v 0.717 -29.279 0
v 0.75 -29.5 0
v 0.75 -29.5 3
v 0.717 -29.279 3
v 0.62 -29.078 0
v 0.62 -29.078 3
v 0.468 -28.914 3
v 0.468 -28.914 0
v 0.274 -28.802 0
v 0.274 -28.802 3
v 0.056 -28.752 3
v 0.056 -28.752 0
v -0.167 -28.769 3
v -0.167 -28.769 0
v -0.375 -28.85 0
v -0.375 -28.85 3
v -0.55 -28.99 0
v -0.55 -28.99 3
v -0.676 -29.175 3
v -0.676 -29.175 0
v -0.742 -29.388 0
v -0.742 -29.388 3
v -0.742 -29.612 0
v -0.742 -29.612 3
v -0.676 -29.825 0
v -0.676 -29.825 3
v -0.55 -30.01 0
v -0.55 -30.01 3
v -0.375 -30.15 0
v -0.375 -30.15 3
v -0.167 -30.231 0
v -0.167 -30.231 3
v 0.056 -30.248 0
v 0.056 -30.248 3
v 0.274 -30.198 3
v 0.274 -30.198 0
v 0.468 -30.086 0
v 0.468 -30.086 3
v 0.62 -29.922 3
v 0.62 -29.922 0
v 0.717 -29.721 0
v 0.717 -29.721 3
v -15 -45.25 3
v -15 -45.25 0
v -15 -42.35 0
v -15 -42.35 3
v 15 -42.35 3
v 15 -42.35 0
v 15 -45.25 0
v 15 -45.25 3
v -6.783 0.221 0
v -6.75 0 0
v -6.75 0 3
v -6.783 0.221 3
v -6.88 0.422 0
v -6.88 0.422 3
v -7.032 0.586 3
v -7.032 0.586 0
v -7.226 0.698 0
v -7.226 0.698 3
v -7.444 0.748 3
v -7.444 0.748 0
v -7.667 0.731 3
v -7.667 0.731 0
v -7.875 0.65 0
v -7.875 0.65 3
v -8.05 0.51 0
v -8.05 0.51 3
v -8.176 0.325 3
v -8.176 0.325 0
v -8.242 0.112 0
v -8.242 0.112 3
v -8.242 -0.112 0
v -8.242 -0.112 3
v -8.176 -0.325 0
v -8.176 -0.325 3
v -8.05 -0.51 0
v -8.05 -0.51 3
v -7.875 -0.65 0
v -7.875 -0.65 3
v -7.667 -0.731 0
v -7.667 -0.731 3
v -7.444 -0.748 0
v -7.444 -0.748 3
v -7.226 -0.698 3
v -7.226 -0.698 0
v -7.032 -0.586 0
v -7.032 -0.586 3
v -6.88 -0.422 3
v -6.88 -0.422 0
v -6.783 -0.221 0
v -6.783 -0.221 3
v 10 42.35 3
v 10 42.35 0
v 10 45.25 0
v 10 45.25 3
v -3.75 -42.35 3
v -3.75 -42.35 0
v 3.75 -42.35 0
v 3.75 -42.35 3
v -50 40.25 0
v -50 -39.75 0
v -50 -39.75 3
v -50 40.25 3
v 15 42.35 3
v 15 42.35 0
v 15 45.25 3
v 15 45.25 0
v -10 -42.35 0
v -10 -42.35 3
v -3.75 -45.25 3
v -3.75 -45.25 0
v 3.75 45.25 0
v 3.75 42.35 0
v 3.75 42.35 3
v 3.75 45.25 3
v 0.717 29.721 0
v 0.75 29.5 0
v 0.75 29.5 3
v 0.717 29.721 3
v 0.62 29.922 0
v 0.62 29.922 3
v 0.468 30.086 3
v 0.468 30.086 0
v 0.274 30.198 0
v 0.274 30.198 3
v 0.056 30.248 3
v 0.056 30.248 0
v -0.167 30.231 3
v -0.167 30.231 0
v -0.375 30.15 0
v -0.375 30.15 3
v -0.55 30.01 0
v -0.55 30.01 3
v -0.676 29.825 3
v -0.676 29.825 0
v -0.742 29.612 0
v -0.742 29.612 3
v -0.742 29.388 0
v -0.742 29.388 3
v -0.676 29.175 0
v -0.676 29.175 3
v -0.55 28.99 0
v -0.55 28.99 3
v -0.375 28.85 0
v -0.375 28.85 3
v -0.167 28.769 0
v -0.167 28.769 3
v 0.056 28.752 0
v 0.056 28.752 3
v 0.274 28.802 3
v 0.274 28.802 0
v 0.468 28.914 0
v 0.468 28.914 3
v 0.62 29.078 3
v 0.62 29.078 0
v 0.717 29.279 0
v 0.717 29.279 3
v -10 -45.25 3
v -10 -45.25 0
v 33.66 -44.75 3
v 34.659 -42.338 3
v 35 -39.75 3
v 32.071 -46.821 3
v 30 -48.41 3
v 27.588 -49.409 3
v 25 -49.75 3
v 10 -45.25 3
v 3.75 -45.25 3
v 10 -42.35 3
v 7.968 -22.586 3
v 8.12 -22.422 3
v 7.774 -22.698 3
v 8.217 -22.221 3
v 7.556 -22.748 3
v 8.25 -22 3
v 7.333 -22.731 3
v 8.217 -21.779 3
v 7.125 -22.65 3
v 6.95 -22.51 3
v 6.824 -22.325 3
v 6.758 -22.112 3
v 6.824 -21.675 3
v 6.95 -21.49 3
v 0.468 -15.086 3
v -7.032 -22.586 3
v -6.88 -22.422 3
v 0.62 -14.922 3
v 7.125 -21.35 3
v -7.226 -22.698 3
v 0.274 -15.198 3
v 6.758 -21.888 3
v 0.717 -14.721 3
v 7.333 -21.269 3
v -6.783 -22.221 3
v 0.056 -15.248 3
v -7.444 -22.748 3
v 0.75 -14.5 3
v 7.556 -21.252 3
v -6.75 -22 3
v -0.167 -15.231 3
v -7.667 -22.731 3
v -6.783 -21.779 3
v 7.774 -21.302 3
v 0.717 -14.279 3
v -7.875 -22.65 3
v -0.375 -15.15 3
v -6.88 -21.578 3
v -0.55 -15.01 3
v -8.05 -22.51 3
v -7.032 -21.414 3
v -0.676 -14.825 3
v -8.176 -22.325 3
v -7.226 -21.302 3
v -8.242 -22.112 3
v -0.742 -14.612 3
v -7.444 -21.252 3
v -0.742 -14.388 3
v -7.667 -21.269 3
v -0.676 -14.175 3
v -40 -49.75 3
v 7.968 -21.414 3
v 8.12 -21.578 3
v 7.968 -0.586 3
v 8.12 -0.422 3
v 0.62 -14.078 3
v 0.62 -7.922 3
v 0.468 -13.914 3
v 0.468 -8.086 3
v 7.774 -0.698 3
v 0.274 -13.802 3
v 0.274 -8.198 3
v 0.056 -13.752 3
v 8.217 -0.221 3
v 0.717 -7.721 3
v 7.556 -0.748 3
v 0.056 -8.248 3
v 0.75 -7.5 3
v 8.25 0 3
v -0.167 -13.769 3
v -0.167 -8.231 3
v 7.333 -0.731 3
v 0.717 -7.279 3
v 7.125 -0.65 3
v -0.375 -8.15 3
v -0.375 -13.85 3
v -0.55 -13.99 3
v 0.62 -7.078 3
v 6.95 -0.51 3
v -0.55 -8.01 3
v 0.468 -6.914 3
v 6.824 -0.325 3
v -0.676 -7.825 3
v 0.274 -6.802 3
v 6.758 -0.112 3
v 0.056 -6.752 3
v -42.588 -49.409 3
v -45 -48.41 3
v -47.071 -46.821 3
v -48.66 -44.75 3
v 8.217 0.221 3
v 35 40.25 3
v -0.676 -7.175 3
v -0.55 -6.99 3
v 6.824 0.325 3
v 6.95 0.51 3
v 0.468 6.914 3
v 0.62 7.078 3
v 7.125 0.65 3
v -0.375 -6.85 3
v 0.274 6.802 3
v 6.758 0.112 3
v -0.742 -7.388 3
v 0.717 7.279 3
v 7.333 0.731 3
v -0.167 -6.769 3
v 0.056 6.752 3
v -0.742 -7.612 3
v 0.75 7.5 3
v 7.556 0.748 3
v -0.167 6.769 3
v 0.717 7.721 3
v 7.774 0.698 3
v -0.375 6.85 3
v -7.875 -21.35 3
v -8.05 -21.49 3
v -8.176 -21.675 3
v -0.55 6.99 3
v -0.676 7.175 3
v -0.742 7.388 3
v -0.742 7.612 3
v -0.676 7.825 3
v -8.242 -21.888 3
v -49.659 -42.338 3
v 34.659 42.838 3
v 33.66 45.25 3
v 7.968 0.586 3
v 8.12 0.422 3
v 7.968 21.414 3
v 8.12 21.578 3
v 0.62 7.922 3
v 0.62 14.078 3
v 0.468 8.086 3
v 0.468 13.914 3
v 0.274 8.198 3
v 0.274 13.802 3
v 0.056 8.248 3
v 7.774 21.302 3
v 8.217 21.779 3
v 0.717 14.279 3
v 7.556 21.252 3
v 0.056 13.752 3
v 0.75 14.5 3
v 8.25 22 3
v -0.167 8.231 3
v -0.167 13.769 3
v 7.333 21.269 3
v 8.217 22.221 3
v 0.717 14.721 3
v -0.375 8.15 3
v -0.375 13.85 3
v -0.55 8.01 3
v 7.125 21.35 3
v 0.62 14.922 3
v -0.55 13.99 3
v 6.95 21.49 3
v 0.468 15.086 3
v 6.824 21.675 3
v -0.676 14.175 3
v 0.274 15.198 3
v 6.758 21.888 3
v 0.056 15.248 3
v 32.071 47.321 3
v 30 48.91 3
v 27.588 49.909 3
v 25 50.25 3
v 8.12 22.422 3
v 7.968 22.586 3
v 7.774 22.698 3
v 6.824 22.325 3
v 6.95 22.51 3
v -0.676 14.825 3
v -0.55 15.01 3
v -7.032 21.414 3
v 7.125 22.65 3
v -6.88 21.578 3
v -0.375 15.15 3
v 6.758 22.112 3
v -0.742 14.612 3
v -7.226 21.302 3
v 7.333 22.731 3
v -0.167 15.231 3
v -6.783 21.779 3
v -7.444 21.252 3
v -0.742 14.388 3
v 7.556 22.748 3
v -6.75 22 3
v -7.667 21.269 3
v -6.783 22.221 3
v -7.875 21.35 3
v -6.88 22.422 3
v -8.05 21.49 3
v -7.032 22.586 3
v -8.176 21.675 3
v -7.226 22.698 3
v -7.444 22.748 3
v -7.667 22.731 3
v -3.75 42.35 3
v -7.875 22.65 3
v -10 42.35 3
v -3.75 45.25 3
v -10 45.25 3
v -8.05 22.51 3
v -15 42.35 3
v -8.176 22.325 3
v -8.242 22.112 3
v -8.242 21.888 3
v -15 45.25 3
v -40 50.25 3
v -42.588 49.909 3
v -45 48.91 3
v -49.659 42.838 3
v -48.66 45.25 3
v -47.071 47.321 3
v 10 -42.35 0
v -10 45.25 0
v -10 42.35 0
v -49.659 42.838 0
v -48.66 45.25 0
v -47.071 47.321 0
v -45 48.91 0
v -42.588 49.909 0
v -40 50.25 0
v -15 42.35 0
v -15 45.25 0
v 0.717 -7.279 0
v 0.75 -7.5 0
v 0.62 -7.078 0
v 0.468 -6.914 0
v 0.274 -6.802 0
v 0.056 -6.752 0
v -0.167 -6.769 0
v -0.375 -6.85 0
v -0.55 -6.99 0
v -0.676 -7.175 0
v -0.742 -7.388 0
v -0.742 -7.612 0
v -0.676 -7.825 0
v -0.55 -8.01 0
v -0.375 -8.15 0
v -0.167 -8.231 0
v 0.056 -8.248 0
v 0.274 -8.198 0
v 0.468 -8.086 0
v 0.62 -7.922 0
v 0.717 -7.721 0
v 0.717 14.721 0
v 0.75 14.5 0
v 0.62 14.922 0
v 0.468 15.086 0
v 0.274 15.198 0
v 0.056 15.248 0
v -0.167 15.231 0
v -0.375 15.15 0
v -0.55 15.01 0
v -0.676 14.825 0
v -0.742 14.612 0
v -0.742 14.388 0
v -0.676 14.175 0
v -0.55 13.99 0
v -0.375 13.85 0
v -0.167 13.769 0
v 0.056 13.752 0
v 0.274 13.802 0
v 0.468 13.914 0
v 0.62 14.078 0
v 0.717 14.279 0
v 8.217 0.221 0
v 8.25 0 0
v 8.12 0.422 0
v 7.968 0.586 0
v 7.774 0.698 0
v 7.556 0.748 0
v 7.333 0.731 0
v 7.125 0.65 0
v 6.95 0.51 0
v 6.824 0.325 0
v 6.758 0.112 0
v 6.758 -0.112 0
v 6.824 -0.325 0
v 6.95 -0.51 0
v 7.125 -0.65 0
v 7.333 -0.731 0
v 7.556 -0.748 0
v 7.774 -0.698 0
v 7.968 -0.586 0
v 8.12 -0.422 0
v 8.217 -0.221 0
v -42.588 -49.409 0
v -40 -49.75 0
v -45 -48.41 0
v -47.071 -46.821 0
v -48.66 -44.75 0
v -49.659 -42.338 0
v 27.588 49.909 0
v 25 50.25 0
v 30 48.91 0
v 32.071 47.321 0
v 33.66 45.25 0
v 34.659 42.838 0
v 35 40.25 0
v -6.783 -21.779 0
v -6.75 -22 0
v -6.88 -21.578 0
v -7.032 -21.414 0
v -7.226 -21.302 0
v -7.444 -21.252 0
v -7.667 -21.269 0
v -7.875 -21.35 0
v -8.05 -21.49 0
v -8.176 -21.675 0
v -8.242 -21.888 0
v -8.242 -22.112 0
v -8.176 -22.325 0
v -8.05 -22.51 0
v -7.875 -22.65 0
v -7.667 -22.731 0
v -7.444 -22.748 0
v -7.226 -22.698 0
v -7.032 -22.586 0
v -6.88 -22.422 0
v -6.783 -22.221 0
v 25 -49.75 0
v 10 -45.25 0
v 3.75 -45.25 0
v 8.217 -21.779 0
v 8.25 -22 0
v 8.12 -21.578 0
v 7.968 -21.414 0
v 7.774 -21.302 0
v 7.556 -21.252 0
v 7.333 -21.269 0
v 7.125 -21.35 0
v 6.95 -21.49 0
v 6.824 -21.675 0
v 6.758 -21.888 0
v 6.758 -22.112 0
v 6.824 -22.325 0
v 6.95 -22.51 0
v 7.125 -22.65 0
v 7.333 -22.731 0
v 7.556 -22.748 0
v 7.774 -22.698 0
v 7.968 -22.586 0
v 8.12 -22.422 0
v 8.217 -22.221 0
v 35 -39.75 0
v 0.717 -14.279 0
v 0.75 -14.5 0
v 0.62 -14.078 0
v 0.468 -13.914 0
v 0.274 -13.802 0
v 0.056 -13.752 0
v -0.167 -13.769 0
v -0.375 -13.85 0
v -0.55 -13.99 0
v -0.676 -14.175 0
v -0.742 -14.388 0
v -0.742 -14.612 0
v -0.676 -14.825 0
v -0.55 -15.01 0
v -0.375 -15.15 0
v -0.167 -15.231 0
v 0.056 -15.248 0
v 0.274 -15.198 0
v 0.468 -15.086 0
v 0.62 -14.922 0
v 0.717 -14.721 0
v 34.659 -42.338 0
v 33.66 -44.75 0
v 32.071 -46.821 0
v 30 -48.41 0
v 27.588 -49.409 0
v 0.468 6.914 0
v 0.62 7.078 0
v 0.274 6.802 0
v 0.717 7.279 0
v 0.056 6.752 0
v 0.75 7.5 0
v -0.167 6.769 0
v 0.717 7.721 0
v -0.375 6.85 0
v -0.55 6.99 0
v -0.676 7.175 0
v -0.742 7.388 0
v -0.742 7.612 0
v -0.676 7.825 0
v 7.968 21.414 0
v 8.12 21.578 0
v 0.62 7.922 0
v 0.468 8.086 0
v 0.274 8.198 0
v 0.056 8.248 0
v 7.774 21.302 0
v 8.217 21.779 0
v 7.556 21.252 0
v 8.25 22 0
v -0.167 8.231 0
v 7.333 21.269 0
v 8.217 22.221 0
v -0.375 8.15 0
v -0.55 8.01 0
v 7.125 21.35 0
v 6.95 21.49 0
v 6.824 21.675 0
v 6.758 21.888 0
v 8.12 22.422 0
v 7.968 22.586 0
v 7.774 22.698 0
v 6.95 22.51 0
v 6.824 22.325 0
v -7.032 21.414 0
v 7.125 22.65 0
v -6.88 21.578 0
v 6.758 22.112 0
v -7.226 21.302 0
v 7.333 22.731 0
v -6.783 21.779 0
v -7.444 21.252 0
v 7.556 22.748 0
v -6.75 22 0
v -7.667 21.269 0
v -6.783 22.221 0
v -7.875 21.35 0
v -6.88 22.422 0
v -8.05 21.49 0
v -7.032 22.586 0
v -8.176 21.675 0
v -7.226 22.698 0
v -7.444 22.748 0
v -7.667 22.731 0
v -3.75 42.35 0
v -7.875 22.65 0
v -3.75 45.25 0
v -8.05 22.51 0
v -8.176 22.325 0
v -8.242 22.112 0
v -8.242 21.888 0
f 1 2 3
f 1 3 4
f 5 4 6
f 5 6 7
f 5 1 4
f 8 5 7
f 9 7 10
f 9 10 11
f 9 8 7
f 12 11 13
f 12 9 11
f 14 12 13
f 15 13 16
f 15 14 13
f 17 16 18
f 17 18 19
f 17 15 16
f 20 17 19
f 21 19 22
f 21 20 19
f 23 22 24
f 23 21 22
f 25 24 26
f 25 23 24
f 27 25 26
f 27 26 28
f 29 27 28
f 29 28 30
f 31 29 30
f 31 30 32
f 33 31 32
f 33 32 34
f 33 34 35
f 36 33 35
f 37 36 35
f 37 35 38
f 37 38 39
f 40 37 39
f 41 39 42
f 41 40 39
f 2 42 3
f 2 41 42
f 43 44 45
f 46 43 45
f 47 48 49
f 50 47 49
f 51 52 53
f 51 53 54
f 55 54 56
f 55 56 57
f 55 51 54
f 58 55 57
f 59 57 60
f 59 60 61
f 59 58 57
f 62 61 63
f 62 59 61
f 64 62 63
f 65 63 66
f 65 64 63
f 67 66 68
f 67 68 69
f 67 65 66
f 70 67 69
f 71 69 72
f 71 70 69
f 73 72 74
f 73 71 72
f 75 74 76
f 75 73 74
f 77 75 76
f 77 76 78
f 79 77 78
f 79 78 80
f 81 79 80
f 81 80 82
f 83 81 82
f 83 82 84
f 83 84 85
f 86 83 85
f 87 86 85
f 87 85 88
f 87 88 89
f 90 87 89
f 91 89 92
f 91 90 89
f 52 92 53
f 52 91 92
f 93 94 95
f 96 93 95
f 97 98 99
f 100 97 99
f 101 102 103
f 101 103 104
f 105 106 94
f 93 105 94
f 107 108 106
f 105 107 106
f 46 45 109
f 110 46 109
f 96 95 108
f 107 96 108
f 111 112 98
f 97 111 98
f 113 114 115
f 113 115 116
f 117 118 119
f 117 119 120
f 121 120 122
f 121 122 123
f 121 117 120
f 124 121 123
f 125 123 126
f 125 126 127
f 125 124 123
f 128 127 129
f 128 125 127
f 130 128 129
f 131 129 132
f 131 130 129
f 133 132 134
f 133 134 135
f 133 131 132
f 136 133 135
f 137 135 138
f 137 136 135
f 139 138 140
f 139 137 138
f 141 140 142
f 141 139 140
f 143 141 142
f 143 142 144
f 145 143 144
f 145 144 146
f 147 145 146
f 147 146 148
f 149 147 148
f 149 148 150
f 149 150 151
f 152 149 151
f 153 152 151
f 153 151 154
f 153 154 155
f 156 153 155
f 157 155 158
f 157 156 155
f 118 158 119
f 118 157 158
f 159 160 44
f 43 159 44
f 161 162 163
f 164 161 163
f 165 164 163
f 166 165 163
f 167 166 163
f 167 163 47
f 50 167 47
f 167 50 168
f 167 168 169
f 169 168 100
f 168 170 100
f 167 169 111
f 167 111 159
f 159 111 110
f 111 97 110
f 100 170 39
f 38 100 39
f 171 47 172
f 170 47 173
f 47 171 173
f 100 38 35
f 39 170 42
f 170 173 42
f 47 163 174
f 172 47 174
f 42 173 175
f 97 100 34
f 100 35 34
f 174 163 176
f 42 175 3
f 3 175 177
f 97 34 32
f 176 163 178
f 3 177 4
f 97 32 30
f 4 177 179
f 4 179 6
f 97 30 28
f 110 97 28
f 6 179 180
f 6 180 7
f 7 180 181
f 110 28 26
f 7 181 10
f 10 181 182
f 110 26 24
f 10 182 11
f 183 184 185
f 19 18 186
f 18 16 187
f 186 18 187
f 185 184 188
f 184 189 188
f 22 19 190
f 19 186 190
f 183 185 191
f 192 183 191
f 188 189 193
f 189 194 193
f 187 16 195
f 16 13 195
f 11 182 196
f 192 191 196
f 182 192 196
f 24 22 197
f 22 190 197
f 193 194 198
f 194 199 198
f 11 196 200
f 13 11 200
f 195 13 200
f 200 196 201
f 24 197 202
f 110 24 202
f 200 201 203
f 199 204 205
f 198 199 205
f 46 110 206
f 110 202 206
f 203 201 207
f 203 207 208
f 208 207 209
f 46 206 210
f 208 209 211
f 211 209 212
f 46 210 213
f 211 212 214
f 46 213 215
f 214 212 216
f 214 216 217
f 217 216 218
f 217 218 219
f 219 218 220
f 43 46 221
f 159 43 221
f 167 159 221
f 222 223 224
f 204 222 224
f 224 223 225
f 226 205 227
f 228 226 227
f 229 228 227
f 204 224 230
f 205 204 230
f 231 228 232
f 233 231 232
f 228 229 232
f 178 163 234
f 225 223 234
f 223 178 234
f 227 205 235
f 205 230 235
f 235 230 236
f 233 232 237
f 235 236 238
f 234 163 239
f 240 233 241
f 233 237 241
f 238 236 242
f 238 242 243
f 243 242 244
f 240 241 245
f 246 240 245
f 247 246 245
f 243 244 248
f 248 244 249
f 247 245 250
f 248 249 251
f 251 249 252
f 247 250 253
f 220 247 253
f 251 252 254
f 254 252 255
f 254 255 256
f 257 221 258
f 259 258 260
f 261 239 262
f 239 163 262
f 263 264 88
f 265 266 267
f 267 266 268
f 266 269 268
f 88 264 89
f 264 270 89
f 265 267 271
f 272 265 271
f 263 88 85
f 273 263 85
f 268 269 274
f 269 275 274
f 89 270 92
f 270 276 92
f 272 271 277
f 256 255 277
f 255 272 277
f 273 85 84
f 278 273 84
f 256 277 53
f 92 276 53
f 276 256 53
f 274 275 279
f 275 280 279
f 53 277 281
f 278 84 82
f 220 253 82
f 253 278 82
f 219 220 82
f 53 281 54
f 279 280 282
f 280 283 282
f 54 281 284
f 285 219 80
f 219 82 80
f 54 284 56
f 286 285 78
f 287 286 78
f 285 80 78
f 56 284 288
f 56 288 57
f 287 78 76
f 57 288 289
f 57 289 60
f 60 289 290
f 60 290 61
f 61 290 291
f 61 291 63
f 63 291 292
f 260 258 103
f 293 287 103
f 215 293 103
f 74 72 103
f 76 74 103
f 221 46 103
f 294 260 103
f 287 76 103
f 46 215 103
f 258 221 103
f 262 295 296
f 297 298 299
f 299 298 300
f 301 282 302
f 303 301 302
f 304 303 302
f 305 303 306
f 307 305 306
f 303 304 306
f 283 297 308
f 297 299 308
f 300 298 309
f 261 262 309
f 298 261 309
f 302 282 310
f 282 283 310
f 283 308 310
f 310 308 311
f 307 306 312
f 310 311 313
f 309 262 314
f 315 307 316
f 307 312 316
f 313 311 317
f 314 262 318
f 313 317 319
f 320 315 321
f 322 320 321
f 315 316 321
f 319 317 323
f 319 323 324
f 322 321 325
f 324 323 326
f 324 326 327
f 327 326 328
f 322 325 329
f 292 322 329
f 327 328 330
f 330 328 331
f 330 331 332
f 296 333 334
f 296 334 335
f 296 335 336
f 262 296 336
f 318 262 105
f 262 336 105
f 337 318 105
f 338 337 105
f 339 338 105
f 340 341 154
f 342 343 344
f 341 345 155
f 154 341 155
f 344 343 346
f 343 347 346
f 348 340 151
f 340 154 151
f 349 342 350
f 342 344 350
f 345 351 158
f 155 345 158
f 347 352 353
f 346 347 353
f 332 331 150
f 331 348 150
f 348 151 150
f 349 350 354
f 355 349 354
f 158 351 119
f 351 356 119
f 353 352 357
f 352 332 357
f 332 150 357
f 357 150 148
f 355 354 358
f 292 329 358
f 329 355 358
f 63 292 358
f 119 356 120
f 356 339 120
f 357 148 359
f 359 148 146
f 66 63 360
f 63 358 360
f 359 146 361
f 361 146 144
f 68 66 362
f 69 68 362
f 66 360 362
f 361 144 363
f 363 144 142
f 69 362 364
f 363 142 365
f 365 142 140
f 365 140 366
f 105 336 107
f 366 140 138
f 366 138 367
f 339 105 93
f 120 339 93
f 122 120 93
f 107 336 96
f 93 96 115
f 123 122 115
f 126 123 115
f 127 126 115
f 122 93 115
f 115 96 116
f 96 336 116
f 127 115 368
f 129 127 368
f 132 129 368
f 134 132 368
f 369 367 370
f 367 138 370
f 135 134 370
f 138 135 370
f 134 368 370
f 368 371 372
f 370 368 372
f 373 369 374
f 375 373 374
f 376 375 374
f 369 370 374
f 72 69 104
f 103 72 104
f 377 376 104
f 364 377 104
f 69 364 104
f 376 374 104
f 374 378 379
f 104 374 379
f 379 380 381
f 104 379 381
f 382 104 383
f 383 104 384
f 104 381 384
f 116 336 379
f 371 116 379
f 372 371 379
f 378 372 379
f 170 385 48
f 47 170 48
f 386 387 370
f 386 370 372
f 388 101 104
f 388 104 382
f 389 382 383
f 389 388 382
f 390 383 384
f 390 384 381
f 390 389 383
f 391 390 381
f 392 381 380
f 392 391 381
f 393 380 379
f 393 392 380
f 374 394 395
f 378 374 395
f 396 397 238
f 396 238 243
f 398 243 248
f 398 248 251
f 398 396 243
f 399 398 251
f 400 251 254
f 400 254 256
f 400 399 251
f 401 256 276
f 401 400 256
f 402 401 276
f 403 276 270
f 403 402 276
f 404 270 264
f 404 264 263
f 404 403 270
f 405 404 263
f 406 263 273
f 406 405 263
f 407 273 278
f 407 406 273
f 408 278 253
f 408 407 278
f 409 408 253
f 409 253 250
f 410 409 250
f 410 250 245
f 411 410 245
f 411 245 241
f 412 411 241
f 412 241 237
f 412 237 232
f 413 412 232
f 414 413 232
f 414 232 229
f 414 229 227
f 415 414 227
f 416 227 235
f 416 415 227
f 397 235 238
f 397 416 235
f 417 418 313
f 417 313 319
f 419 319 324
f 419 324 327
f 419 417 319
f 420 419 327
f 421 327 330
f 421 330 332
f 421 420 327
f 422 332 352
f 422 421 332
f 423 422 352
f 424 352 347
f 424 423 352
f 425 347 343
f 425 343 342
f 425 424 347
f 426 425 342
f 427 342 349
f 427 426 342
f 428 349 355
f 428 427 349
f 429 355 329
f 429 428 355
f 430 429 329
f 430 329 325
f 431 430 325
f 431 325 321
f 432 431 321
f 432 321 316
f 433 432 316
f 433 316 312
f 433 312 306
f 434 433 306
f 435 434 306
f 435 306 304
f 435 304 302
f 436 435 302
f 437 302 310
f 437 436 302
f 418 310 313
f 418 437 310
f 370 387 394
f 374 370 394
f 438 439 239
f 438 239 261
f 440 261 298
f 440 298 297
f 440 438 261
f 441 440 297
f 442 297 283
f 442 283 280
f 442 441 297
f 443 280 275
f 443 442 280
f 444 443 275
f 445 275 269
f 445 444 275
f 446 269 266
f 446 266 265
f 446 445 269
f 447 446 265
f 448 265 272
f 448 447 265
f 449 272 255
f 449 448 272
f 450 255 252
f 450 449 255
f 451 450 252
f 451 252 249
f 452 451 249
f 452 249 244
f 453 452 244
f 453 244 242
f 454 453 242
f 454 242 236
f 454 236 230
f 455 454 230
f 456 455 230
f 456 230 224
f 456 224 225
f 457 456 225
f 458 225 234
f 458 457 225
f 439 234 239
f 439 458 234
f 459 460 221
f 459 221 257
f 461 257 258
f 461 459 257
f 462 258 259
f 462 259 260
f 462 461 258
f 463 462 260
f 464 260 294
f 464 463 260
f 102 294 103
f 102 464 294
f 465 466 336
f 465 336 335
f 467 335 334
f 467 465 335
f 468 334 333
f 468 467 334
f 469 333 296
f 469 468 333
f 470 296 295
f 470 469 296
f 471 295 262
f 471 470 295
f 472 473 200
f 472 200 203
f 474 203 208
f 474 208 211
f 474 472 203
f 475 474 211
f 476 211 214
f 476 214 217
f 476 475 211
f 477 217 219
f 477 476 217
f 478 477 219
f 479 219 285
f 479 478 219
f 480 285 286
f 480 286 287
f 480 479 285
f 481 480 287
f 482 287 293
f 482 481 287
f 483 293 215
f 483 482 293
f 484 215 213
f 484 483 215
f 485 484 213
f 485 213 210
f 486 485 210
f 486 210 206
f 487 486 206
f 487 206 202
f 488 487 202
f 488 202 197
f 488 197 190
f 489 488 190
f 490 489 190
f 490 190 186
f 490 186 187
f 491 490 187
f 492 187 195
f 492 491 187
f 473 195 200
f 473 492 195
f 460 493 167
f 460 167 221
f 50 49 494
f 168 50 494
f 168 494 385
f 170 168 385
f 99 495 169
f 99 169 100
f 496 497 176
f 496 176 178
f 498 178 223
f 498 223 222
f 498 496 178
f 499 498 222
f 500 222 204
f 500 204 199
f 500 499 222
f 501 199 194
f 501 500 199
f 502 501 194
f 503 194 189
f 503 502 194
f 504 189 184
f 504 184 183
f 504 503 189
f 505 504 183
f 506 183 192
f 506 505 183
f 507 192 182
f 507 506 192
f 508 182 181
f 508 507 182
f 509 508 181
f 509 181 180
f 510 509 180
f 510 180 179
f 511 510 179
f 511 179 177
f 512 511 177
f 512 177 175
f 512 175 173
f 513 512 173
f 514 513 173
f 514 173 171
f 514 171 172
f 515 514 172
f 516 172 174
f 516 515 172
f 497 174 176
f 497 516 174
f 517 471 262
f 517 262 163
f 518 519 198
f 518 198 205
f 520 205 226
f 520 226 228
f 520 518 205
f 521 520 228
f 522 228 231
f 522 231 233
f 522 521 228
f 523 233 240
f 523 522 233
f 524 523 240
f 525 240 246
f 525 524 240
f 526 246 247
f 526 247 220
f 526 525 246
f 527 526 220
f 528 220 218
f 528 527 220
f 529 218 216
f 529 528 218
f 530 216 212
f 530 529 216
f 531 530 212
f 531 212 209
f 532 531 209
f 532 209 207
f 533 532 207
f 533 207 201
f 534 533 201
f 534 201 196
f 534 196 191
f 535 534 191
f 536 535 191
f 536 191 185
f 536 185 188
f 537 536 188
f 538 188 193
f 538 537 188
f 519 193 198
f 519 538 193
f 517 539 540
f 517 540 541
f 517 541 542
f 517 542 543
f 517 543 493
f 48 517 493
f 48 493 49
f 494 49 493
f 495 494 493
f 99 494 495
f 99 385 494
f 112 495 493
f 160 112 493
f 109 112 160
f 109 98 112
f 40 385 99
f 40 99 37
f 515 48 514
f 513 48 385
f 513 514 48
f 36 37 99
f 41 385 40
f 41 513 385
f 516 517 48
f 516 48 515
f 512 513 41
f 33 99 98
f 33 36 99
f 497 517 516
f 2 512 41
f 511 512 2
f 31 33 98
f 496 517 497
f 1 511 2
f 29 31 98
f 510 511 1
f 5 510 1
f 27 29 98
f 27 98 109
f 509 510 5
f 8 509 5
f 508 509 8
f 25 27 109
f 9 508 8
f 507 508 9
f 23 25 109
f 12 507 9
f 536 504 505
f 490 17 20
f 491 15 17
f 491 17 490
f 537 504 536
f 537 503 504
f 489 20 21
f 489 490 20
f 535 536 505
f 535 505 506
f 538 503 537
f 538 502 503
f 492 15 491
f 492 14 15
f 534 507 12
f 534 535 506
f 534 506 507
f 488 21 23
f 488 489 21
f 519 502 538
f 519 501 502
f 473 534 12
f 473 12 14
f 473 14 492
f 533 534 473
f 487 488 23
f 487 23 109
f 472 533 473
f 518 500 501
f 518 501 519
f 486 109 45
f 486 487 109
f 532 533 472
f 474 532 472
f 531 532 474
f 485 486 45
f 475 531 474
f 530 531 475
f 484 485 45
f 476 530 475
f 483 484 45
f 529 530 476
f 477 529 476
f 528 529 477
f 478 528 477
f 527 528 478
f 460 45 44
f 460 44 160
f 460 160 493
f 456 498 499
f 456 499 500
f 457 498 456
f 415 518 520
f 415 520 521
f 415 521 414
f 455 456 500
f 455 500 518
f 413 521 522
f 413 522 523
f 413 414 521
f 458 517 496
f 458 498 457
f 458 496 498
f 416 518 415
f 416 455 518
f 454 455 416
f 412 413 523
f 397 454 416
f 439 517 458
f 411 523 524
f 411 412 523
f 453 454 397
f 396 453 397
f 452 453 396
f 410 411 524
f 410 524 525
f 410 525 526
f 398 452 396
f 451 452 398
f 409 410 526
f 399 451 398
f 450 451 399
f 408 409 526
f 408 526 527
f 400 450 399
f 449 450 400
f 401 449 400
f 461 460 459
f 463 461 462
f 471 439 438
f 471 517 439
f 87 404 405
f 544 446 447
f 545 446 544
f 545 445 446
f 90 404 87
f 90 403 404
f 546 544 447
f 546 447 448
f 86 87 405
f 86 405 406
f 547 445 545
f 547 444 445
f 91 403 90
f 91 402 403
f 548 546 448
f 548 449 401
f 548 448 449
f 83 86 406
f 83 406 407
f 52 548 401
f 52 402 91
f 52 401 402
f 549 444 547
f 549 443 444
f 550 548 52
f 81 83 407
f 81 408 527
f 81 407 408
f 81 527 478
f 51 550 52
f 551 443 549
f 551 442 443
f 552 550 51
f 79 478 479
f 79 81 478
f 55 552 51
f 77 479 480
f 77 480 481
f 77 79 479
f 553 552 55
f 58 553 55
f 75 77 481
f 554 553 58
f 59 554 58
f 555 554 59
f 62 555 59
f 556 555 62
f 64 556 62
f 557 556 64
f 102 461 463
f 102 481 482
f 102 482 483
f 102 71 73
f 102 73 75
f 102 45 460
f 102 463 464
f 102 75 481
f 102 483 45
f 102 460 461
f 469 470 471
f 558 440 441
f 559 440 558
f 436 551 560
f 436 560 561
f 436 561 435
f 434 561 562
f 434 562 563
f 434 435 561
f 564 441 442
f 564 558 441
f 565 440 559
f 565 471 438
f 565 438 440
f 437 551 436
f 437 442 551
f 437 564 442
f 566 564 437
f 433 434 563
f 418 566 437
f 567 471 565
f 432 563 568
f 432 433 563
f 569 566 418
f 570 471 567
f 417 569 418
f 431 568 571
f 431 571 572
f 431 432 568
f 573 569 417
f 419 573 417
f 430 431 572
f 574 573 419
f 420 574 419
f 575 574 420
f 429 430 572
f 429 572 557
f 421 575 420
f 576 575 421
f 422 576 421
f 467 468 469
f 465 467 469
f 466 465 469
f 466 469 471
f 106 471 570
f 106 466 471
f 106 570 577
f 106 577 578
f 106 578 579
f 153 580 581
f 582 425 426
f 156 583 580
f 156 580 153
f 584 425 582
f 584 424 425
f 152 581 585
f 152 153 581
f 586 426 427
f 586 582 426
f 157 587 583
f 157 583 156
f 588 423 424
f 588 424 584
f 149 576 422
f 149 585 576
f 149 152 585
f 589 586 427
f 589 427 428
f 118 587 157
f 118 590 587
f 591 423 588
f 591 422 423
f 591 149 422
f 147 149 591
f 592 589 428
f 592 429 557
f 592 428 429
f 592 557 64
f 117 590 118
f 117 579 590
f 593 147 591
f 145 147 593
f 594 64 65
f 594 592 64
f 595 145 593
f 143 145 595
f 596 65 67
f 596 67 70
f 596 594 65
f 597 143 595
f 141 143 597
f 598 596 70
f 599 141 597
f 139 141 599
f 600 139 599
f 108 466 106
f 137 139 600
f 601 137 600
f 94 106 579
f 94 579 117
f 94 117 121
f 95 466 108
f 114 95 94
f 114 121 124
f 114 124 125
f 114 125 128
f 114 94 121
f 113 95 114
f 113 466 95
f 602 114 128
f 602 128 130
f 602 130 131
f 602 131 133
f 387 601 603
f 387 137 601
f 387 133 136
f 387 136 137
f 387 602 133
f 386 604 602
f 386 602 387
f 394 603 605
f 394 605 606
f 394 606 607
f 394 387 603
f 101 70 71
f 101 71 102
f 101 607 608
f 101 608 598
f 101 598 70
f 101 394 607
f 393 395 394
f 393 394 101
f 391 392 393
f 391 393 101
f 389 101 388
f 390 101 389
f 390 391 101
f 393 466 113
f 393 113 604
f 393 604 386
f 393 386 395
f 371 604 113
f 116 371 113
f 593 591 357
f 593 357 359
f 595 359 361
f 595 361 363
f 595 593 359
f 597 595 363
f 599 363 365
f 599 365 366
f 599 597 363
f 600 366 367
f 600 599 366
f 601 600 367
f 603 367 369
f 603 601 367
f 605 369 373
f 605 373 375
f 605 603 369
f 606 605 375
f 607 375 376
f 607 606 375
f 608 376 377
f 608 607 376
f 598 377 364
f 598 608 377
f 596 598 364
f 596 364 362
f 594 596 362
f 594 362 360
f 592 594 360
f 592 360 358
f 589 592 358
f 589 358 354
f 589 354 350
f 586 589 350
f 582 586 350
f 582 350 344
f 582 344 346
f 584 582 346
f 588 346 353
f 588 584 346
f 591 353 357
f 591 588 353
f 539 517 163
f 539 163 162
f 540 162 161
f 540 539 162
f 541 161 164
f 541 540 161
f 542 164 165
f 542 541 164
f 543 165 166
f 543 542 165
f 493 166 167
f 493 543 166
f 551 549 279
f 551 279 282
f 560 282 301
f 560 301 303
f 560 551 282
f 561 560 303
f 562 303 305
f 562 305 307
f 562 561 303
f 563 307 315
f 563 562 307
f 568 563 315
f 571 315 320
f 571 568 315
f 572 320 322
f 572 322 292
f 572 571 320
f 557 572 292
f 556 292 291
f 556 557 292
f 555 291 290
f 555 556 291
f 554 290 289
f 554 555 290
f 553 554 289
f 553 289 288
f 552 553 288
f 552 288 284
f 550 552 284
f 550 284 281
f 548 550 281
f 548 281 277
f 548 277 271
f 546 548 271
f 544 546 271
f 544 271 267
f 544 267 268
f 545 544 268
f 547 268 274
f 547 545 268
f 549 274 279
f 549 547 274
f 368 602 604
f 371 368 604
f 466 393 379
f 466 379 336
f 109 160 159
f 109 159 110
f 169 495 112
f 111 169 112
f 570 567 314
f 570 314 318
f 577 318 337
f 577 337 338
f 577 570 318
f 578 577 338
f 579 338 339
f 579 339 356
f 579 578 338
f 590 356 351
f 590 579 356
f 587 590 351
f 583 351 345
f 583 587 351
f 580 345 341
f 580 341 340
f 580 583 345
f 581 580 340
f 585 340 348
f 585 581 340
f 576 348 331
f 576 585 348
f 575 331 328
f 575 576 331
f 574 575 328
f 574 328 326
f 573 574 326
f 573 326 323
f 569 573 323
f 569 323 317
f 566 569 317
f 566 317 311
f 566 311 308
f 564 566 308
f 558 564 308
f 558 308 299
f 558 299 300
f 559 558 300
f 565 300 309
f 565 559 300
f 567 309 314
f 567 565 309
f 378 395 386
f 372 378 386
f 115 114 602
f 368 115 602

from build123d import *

# Parameters (mm, degrees)
SKETCH1_R           = 0.75
SKETCH1_W           = 6.25
SKETCH1_H           = 2.9
BOSS_EXTRUDE1_DEPTH = 3


with BuildPart() as part:
    # Sketch1 → Boss-Extrude1 (new body)
    # profile 1 of 6: a face of its own
    with BuildSketch(Plane.XY):
        with BuildLine():
            ThreePointArc((-50, 40.25), (-47.071067812, 47.321067812), (-40, 50.25))
            Line((-40, 50.25), (25, 50.25))
            ThreePointArc((25, 50.25), (32.071067812, 47.321067812), (35, 40.25))
            Line((35, 40.25), (35, -39.75))
            ThreePointArc((35, -39.75), (32.071067812, -46.821067812), (25, -49.75))
            Line((25, -49.75), (-40, -49.75))
            ThreePointArc((-40, -49.75), (-47.071067812, -46.821067812), (-50, -39.75))
            Line((-50, -39.75), (-50, 40.25))
        make_face()
        Polygon((-3.75, -45.25), (3.75, -45.25), (10, -45.25), (15, -45.25), (15, -42.35), (15, 42.35), (15, 45.25), (10, 45.25), (3.75, 45.25), (-3.75, 45.25), (-10, 45.25), (-15, 45.25), (-15, 42.35), (-15, -42.35), (-15, -45.25), (-10, -45.25), align=None, mode=Mode.SUBTRACT)
    # profile 2 of 6: a face of its own
    with BuildSketch(Plane.XY):
        Polygon((-3.75, -42.35), (3.75, -42.35), (10, -42.35), (15, -42.35), (15, 42.35), (10, 42.35), (3.75, 42.35), (-3.75, 42.35), (-10, 42.35), (-15, 42.35), (-15, -42.35), (-10, -42.35), align=None)
        with Locations((7.5, -22)):
            Circle(SKETCH1_R, mode=Mode.SUBTRACT)
        with Locations((0, -29.5)):
            Circle(SKETCH1_R, mode=Mode.SUBTRACT)
        with Locations((-7.5, -22)):
            Circle(SKETCH1_R, mode=Mode.SUBTRACT)
        with Locations((0, -14.5)):
            Circle(SKETCH1_R, mode=Mode.SUBTRACT)
        with Locations((7.5, 0)):
            Circle(SKETCH1_R, mode=Mode.SUBTRACT)
        with Locations((0, -7.5)):
            Circle(SKETCH1_R, mode=Mode.SUBTRACT)
        with Locations((-7.5, 0)):
            Circle(SKETCH1_R, mode=Mode.SUBTRACT)
        with Locations((0, 7.5)):
            Circle(SKETCH1_R, mode=Mode.SUBTRACT)
        with Locations((-7.5, 22)):
            Circle(SKETCH1_R, mode=Mode.SUBTRACT)
        with Locations((0, 14.5)):
            Circle(SKETCH1_R, mode=Mode.SUBTRACT)
        with Locations((7.5, 22)):
            Circle(SKETCH1_R, mode=Mode.SUBTRACT)
        with Locations((0, 29.5)):
            Circle(SKETCH1_R, mode=Mode.SUBTRACT)
    # profile 3 of 6: a face of its own
    with BuildSketch(Plane.XY):
        with Locations((-6.875, 43.8)):
            Rectangle(SKETCH1_W, SKETCH1_H)
    # profile 4 of 6: a face of its own
    with BuildSketch(Plane.XY):
        with Locations((6.875, 43.8)):
            Rectangle(SKETCH1_W, SKETCH1_H)
    # profile 5 of 6: a face of its own
    with BuildSketch(Plane.XY):
        with Locations((-6.875, -43.8)):
            Rectangle(SKETCH1_W, SKETCH1_H)
    # profile 6 of 6: a face of its own
    with BuildSketch(Plane.XY):
        with Locations((6.875, -43.8)):
            Rectangle(SKETCH1_W, SKETCH1_H)
    extrude(amount=BOSS_EXTRUDE1_DEPTH)


solid = part.part
